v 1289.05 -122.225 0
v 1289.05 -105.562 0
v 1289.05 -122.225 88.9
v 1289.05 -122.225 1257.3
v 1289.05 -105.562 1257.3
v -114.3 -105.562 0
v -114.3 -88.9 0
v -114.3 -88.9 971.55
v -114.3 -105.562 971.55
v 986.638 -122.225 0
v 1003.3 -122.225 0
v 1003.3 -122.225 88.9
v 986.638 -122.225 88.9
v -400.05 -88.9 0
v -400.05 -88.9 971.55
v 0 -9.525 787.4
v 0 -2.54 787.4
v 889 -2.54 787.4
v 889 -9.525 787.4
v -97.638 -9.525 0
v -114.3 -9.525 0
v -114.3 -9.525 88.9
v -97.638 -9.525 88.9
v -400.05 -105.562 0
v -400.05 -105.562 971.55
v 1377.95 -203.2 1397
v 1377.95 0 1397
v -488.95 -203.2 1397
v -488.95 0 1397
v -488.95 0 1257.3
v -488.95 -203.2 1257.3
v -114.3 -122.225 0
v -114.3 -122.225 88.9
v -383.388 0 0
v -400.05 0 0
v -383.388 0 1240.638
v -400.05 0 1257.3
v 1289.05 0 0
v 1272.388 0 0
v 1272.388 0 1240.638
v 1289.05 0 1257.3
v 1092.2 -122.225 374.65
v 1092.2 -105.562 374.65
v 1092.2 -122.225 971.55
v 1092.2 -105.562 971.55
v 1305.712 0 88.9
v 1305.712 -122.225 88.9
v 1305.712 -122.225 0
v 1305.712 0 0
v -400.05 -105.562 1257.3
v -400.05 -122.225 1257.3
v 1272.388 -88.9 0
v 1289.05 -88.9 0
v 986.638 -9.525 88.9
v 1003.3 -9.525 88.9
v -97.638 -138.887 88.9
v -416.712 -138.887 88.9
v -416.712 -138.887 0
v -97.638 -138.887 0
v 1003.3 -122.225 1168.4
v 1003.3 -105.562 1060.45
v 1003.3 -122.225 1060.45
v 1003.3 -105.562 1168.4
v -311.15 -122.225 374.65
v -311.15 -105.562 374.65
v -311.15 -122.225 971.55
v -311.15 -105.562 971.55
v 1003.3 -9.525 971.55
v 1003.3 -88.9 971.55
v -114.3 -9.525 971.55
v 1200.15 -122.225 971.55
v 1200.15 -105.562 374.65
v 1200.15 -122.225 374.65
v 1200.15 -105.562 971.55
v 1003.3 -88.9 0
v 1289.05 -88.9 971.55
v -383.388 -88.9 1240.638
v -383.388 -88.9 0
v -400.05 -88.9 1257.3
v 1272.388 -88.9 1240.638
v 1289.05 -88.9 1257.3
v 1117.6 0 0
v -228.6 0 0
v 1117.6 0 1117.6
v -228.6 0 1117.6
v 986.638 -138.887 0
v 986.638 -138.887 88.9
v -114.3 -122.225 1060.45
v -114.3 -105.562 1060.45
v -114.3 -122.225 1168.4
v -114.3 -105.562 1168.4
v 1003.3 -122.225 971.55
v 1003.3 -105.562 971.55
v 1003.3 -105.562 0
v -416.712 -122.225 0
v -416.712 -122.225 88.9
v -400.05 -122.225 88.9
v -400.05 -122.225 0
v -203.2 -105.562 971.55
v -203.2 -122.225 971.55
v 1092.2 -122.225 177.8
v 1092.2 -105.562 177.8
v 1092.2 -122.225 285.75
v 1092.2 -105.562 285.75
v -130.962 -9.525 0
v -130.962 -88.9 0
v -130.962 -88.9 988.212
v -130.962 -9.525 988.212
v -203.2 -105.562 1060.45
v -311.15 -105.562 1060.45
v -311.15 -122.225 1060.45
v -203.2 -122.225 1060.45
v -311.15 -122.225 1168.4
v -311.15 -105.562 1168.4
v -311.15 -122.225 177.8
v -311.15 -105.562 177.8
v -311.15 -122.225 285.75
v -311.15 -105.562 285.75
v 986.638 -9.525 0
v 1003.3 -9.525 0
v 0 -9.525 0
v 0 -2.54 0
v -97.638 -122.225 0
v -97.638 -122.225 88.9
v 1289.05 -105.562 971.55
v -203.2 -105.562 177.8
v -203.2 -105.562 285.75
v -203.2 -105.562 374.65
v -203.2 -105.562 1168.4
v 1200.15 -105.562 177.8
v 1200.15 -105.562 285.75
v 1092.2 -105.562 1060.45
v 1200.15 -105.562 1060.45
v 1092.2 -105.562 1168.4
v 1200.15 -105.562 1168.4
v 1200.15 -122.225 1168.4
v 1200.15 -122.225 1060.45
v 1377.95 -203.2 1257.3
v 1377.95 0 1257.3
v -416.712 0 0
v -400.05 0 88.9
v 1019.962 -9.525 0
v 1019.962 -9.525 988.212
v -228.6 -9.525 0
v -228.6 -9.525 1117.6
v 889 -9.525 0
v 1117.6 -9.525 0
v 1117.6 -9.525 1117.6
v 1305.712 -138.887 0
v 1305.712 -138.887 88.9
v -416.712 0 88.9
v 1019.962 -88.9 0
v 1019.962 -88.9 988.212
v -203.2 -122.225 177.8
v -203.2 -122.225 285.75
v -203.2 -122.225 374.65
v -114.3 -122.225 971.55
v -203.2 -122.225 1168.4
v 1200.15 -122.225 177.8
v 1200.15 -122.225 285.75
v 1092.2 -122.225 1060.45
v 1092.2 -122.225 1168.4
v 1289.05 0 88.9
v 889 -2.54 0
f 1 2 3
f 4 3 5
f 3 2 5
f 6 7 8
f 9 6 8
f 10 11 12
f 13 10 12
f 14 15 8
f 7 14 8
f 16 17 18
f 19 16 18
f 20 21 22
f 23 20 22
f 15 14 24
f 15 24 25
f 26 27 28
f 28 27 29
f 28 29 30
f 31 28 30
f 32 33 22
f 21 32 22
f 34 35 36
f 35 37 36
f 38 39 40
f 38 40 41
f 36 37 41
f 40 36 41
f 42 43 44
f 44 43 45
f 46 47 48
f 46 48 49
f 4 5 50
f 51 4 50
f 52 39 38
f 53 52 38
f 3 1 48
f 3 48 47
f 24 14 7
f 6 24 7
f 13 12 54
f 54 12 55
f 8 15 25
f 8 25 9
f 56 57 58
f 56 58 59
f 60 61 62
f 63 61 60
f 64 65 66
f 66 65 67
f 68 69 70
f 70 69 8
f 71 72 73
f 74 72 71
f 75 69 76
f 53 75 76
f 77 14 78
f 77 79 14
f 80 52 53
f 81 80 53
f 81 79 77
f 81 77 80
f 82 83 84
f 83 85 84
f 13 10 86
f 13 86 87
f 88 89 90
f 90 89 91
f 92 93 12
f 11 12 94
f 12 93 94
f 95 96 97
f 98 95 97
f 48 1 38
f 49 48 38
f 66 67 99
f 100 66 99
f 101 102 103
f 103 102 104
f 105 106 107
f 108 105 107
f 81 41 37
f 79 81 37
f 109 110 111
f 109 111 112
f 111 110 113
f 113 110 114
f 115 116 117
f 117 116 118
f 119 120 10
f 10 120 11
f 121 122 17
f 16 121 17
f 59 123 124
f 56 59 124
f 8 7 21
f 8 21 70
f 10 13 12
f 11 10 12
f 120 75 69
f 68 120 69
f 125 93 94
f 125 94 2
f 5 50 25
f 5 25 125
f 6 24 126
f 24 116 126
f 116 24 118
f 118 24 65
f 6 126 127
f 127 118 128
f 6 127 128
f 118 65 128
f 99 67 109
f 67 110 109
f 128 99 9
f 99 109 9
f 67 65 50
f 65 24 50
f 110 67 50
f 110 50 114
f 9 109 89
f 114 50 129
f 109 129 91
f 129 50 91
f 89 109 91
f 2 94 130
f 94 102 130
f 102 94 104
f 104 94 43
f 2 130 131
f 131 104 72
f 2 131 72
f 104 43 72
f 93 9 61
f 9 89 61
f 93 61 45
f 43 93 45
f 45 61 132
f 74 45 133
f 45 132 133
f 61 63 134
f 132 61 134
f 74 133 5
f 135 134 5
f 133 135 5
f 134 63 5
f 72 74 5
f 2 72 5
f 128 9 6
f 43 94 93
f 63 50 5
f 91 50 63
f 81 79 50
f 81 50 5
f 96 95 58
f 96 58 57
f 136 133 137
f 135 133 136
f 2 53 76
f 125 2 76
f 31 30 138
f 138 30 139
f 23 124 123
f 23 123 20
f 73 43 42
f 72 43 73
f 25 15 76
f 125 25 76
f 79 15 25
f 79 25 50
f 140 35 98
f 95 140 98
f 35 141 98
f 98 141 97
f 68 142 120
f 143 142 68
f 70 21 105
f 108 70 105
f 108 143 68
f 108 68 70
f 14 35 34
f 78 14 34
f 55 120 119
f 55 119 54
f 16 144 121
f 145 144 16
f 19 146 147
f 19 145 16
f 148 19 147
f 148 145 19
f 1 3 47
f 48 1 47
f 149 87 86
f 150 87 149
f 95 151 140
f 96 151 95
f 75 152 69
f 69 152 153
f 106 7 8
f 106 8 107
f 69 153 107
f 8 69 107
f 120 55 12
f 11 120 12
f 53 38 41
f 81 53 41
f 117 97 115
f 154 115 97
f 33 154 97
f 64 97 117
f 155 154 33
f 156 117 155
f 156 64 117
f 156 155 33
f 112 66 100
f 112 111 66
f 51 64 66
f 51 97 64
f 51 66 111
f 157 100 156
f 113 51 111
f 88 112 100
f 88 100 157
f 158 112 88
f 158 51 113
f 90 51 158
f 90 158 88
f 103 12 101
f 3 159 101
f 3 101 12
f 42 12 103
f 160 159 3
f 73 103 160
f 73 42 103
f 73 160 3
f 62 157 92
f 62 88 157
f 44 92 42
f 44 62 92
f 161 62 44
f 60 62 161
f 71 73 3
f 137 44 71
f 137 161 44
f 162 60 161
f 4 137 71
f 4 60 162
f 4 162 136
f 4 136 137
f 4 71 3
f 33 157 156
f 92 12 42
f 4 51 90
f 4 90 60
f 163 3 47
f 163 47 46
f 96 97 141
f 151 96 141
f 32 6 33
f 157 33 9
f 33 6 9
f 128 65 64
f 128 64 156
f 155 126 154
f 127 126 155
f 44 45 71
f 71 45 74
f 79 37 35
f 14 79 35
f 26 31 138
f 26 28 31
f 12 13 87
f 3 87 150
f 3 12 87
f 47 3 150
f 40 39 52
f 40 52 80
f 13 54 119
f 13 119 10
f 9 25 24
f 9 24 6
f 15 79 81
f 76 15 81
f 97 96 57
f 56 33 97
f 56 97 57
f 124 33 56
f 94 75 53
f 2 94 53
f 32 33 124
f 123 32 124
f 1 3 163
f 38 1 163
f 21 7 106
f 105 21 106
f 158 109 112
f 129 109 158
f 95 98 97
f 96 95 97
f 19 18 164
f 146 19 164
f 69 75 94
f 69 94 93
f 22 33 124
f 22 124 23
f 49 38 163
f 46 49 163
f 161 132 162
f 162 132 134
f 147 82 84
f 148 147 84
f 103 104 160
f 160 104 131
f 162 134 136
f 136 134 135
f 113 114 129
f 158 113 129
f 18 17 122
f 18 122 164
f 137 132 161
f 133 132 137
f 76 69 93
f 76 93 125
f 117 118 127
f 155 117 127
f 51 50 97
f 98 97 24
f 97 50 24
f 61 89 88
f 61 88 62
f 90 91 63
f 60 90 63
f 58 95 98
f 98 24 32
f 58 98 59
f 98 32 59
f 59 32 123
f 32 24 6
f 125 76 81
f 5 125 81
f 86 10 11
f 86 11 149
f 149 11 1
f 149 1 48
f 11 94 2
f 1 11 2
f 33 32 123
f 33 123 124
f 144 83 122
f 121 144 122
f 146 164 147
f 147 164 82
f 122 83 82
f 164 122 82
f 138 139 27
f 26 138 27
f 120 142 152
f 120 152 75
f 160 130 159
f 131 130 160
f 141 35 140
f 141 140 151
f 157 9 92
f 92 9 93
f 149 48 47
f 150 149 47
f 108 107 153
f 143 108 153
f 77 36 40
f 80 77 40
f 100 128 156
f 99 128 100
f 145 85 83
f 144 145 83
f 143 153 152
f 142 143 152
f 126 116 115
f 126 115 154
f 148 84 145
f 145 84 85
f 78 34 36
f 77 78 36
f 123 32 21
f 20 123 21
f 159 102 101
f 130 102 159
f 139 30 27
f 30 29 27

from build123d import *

# Parameters (mm, degrees)
F0_W      = 889
F0_H      = 787.4
F1_DEPTH  = 2.54
F3_DEPTH  = 9.525
F4_W      = 16.6624
F4_H      = 1240.6376
F5_DEPTH  = 88.9
F6_W      = 1689.1
F6_H      = 285.75
F7_DEPTH  = 16.6624
F8_W      = 285.75
F8_H      = 971.55
F9_DEPTH  = 16.6624
F10_W     = 107.95
F10_H     = 107.95
F10_H_2   = 596.9
F10_W_2   = 1117.6
F11_DEPTH = 16.6624
F12_W     = 319.0748
F12_H     = 88.9
F13_DEPTH = 16.6624
F15_DEPTH = 203.2
F16_W     = 122.2248
F16_H     = 88.9
F17_DEPTH = 16.6624
F18_W     = 105.5624
F18_H     = 88.9
F18_W_2   = 16.6624
F19_DEPTH = 16.6624
F20_W     = 16.6624
F20_H     = 971.55
F21_DEPTH = 79.375
F22_W     = 112.6998
F22_H     = 88.9
F23_DEPTH = 16.6624
F24_W     = 79.375
F24_H     = 88.9
F24_W_2   = 33.3248
F25_DEPTH = 16.6624


# Not quite as in the source:
# - a feature names something its author has since deleted; it is built from what else it names


with BuildPart() as f1:
    # F0 (on Front) → F1 (new body)
    with BuildSketch(Plane.XZ):
        with Locations((444.5, 393.7)):
            Rectangle(F0_W, F0_H)
    extrude(amount=F1_DEPTH)

    # F2 (on Front) → F3 (join)
    with BuildSketch(Plane.XZ):
        Polygon((-228.6, 0), (0, 0), (0, 787.4), (889, 787.4), (889, 0), (1117.6, 0), (1117.6, 1117.6), (-228.6, 1117.6), align=None)
    extrude(amount=F3_DEPTH)


with BuildPart() as f5:
    # F4 (on Front) → F5 (new body)
    with BuildSketch(Plane.XZ):
        with Locations((-391.7188, 620.3188)):
            Rectangle(F4_W, F4_H)
        Polygon((-383.3876, 1240.6376), (1272.3876, 1240.6376), (1289.05, 1240.6376), (1289.05, 1257.3), (-400.05, 1257.3), (-400.05, 1240.6376), align=None)
        with Locations((1280.7188, 620.3188)):
            Rectangle(F4_W, F4_H)
    extrude(amount=F5_DEPTH)


with BuildPart() as f7:
    # F6 (on face) → F7 (new body)
    with BuildSketch(Plane.XZ.offset(88.9)):
        with Locations((444.5, 1114.425)):
            Rectangle(F6_W, F6_H)
    extrude(amount=F7_DEPTH)


with BuildPart() as f9:
    # F8 (on face) → F9 (new body)
    with BuildSketch(Plane.XZ.offset(88.9)):
        with Locations((-257.175, 485.775)):
            Rectangle(F8_W, F8_H)
    extrude(amount=F9_DEPTH)


with BuildPart() as f9b:
    # F8 (on face) → F9, piece 2 (new body)
    with BuildSketch(Plane.XZ.offset(88.9)):
        with Locations((1146.175, 485.775)):
            Rectangle(F8_W, F8_H)
    extrude(amount=F9_DEPTH)


with BuildPart() as f11:
    # F10 (on face) → F11 (new body)
    with BuildSketch(Plane.XZ.offset(105.5624)):
        Polygon((-400.05, 971.55), (-400.05, 0), (-114.3, 0), (-114.3, 971.55), (1003.3, 971.55), (1003.3, 0), (1289.05, 0), (1289.05, 971.55), (1289.05, 1257.3), (-400.05, 1257.3), align=None)
        with Locations((-257.175, 231.775)):
            Rectangle(F10_W, F10_H, mode=Mode.SUBTRACT)
        with Locations((1146.175, 231.775)):
            Rectangle(F10_W, F10_H, mode=Mode.SUBTRACT)
        with Locations((-257.175, 673.1)):
            Rectangle(F10_W, F10_H_2, mode=Mode.SUBTRACT)
        with Locations((-257.175, 1114.425)):
            Rectangle(F10_W, F10_H, mode=Mode.SUBTRACT)
        with Locations((1146.175, 673.1)):
            Rectangle(F10_W, F10_H_2, mode=Mode.SUBTRACT)
        with Locations((444.5, 1114.425)):
            Rectangle(F10_W_2, F10_H, mode=Mode.SUBTRACT)
        with Locations((1146.175, 1114.425)):
            Rectangle(F10_W, F10_H, mode=Mode.SUBTRACT)
    extrude(amount=F11_DEPTH)

    # F12 (on face) → F13 (join)
    with BuildSketch(Plane.XZ.offset(122.2248)):
        with Locations((-257.175, 44.45)):
            Rectangle(F12_W, F12_H)
        with Locations((1146.175, 44.45)):
            Rectangle(F12_W, F12_H)
    extrude(amount=F13_DEPTH)


with BuildPart() as f15:
    # F14 (on Front) → F15 (new body)
    with BuildSketch(Plane.XZ):
        Polygon((-488.95, 1257.3), (-400.05, 1257.3), (1289.05, 1257.3), (1377.95, 1257.3), (1377.95, 1397), (-488.95, 1397), align=None)
    extrude(amount=F15_DEPTH)


with BuildPart() as f17:
    # F16 (on face) → F17 (new body)
    with BuildSketch(Plane.YZ.offset(1289.05)):
        with Locations((-61.1124, 44.45)):
            Rectangle(F16_W, F16_H)
    extrude(amount=F17_DEPTH)


with BuildPart() as f19:
    # F18 (on face) → F19 (new body)
    with BuildSketch(Plane(origin=(-400.05, 0, 0), x_dir=(0, -1, 0), z_dir=(-1, 0, 0))):
        with Locations((52.7812, 44.45)):
            Rectangle(F18_W, F18_H)
        with Locations((113.8936, 44.45)):
            Rectangle(F18_W_2, F18_H)
    extrude(amount=F19_DEPTH)


with BuildPart() as f21:
    # F20 (on face) → F21 (new body)
    with BuildSketch(Plane(origin=(0, -88.9, 0), x_dir=(-1, 0, 0), z_dir=(0, 1, 0))):
        with Locations((122.6312, 485.775)):
            Rectangle(F20_W, F20_H)
        Polygon((-1003.3, 971.55), (114.3, 971.55), (130.9624, 971.55), (130.9624, 988.2124), (-1019.9624, 988.2124), (-1019.9624, 971.55), align=None)
        with Locations((-1011.6312, 485.775)):
            Rectangle(F20_W, F20_H)
    extrude(amount=F21_DEPTH)


with BuildPart() as f23:
    # F22 (on face) → F23 (new body)
    with BuildSketch(Plane.YZ.offset(-114.3)):
        with Locations((-65.8749, 44.45)):
            Rectangle(F22_W, F22_H)
    extrude(amount=F23_DEPTH)


with BuildPart() as f25:
    # F24 (on face) → F25 (new body)
    with BuildSketch(Plane(origin=(1003.3, 0, 0), x_dir=(0, -1, 0), z_dir=(-1, 0, 0))):
        with Locations((49.2125, 44.45)):
            Rectangle(F24_W, F24_H)
        with Locations((105.5624, 44.45)):
            Rectangle(F24_W_2, F24_H)
    extrude(amount=F25_DEPTH)


solid = Compound([f1.part, f5.part, f7.part, f9.part, f9b.part, f11.part, f15.part, f17.part, f19.part, f21.part, f23.part, f25.part])
